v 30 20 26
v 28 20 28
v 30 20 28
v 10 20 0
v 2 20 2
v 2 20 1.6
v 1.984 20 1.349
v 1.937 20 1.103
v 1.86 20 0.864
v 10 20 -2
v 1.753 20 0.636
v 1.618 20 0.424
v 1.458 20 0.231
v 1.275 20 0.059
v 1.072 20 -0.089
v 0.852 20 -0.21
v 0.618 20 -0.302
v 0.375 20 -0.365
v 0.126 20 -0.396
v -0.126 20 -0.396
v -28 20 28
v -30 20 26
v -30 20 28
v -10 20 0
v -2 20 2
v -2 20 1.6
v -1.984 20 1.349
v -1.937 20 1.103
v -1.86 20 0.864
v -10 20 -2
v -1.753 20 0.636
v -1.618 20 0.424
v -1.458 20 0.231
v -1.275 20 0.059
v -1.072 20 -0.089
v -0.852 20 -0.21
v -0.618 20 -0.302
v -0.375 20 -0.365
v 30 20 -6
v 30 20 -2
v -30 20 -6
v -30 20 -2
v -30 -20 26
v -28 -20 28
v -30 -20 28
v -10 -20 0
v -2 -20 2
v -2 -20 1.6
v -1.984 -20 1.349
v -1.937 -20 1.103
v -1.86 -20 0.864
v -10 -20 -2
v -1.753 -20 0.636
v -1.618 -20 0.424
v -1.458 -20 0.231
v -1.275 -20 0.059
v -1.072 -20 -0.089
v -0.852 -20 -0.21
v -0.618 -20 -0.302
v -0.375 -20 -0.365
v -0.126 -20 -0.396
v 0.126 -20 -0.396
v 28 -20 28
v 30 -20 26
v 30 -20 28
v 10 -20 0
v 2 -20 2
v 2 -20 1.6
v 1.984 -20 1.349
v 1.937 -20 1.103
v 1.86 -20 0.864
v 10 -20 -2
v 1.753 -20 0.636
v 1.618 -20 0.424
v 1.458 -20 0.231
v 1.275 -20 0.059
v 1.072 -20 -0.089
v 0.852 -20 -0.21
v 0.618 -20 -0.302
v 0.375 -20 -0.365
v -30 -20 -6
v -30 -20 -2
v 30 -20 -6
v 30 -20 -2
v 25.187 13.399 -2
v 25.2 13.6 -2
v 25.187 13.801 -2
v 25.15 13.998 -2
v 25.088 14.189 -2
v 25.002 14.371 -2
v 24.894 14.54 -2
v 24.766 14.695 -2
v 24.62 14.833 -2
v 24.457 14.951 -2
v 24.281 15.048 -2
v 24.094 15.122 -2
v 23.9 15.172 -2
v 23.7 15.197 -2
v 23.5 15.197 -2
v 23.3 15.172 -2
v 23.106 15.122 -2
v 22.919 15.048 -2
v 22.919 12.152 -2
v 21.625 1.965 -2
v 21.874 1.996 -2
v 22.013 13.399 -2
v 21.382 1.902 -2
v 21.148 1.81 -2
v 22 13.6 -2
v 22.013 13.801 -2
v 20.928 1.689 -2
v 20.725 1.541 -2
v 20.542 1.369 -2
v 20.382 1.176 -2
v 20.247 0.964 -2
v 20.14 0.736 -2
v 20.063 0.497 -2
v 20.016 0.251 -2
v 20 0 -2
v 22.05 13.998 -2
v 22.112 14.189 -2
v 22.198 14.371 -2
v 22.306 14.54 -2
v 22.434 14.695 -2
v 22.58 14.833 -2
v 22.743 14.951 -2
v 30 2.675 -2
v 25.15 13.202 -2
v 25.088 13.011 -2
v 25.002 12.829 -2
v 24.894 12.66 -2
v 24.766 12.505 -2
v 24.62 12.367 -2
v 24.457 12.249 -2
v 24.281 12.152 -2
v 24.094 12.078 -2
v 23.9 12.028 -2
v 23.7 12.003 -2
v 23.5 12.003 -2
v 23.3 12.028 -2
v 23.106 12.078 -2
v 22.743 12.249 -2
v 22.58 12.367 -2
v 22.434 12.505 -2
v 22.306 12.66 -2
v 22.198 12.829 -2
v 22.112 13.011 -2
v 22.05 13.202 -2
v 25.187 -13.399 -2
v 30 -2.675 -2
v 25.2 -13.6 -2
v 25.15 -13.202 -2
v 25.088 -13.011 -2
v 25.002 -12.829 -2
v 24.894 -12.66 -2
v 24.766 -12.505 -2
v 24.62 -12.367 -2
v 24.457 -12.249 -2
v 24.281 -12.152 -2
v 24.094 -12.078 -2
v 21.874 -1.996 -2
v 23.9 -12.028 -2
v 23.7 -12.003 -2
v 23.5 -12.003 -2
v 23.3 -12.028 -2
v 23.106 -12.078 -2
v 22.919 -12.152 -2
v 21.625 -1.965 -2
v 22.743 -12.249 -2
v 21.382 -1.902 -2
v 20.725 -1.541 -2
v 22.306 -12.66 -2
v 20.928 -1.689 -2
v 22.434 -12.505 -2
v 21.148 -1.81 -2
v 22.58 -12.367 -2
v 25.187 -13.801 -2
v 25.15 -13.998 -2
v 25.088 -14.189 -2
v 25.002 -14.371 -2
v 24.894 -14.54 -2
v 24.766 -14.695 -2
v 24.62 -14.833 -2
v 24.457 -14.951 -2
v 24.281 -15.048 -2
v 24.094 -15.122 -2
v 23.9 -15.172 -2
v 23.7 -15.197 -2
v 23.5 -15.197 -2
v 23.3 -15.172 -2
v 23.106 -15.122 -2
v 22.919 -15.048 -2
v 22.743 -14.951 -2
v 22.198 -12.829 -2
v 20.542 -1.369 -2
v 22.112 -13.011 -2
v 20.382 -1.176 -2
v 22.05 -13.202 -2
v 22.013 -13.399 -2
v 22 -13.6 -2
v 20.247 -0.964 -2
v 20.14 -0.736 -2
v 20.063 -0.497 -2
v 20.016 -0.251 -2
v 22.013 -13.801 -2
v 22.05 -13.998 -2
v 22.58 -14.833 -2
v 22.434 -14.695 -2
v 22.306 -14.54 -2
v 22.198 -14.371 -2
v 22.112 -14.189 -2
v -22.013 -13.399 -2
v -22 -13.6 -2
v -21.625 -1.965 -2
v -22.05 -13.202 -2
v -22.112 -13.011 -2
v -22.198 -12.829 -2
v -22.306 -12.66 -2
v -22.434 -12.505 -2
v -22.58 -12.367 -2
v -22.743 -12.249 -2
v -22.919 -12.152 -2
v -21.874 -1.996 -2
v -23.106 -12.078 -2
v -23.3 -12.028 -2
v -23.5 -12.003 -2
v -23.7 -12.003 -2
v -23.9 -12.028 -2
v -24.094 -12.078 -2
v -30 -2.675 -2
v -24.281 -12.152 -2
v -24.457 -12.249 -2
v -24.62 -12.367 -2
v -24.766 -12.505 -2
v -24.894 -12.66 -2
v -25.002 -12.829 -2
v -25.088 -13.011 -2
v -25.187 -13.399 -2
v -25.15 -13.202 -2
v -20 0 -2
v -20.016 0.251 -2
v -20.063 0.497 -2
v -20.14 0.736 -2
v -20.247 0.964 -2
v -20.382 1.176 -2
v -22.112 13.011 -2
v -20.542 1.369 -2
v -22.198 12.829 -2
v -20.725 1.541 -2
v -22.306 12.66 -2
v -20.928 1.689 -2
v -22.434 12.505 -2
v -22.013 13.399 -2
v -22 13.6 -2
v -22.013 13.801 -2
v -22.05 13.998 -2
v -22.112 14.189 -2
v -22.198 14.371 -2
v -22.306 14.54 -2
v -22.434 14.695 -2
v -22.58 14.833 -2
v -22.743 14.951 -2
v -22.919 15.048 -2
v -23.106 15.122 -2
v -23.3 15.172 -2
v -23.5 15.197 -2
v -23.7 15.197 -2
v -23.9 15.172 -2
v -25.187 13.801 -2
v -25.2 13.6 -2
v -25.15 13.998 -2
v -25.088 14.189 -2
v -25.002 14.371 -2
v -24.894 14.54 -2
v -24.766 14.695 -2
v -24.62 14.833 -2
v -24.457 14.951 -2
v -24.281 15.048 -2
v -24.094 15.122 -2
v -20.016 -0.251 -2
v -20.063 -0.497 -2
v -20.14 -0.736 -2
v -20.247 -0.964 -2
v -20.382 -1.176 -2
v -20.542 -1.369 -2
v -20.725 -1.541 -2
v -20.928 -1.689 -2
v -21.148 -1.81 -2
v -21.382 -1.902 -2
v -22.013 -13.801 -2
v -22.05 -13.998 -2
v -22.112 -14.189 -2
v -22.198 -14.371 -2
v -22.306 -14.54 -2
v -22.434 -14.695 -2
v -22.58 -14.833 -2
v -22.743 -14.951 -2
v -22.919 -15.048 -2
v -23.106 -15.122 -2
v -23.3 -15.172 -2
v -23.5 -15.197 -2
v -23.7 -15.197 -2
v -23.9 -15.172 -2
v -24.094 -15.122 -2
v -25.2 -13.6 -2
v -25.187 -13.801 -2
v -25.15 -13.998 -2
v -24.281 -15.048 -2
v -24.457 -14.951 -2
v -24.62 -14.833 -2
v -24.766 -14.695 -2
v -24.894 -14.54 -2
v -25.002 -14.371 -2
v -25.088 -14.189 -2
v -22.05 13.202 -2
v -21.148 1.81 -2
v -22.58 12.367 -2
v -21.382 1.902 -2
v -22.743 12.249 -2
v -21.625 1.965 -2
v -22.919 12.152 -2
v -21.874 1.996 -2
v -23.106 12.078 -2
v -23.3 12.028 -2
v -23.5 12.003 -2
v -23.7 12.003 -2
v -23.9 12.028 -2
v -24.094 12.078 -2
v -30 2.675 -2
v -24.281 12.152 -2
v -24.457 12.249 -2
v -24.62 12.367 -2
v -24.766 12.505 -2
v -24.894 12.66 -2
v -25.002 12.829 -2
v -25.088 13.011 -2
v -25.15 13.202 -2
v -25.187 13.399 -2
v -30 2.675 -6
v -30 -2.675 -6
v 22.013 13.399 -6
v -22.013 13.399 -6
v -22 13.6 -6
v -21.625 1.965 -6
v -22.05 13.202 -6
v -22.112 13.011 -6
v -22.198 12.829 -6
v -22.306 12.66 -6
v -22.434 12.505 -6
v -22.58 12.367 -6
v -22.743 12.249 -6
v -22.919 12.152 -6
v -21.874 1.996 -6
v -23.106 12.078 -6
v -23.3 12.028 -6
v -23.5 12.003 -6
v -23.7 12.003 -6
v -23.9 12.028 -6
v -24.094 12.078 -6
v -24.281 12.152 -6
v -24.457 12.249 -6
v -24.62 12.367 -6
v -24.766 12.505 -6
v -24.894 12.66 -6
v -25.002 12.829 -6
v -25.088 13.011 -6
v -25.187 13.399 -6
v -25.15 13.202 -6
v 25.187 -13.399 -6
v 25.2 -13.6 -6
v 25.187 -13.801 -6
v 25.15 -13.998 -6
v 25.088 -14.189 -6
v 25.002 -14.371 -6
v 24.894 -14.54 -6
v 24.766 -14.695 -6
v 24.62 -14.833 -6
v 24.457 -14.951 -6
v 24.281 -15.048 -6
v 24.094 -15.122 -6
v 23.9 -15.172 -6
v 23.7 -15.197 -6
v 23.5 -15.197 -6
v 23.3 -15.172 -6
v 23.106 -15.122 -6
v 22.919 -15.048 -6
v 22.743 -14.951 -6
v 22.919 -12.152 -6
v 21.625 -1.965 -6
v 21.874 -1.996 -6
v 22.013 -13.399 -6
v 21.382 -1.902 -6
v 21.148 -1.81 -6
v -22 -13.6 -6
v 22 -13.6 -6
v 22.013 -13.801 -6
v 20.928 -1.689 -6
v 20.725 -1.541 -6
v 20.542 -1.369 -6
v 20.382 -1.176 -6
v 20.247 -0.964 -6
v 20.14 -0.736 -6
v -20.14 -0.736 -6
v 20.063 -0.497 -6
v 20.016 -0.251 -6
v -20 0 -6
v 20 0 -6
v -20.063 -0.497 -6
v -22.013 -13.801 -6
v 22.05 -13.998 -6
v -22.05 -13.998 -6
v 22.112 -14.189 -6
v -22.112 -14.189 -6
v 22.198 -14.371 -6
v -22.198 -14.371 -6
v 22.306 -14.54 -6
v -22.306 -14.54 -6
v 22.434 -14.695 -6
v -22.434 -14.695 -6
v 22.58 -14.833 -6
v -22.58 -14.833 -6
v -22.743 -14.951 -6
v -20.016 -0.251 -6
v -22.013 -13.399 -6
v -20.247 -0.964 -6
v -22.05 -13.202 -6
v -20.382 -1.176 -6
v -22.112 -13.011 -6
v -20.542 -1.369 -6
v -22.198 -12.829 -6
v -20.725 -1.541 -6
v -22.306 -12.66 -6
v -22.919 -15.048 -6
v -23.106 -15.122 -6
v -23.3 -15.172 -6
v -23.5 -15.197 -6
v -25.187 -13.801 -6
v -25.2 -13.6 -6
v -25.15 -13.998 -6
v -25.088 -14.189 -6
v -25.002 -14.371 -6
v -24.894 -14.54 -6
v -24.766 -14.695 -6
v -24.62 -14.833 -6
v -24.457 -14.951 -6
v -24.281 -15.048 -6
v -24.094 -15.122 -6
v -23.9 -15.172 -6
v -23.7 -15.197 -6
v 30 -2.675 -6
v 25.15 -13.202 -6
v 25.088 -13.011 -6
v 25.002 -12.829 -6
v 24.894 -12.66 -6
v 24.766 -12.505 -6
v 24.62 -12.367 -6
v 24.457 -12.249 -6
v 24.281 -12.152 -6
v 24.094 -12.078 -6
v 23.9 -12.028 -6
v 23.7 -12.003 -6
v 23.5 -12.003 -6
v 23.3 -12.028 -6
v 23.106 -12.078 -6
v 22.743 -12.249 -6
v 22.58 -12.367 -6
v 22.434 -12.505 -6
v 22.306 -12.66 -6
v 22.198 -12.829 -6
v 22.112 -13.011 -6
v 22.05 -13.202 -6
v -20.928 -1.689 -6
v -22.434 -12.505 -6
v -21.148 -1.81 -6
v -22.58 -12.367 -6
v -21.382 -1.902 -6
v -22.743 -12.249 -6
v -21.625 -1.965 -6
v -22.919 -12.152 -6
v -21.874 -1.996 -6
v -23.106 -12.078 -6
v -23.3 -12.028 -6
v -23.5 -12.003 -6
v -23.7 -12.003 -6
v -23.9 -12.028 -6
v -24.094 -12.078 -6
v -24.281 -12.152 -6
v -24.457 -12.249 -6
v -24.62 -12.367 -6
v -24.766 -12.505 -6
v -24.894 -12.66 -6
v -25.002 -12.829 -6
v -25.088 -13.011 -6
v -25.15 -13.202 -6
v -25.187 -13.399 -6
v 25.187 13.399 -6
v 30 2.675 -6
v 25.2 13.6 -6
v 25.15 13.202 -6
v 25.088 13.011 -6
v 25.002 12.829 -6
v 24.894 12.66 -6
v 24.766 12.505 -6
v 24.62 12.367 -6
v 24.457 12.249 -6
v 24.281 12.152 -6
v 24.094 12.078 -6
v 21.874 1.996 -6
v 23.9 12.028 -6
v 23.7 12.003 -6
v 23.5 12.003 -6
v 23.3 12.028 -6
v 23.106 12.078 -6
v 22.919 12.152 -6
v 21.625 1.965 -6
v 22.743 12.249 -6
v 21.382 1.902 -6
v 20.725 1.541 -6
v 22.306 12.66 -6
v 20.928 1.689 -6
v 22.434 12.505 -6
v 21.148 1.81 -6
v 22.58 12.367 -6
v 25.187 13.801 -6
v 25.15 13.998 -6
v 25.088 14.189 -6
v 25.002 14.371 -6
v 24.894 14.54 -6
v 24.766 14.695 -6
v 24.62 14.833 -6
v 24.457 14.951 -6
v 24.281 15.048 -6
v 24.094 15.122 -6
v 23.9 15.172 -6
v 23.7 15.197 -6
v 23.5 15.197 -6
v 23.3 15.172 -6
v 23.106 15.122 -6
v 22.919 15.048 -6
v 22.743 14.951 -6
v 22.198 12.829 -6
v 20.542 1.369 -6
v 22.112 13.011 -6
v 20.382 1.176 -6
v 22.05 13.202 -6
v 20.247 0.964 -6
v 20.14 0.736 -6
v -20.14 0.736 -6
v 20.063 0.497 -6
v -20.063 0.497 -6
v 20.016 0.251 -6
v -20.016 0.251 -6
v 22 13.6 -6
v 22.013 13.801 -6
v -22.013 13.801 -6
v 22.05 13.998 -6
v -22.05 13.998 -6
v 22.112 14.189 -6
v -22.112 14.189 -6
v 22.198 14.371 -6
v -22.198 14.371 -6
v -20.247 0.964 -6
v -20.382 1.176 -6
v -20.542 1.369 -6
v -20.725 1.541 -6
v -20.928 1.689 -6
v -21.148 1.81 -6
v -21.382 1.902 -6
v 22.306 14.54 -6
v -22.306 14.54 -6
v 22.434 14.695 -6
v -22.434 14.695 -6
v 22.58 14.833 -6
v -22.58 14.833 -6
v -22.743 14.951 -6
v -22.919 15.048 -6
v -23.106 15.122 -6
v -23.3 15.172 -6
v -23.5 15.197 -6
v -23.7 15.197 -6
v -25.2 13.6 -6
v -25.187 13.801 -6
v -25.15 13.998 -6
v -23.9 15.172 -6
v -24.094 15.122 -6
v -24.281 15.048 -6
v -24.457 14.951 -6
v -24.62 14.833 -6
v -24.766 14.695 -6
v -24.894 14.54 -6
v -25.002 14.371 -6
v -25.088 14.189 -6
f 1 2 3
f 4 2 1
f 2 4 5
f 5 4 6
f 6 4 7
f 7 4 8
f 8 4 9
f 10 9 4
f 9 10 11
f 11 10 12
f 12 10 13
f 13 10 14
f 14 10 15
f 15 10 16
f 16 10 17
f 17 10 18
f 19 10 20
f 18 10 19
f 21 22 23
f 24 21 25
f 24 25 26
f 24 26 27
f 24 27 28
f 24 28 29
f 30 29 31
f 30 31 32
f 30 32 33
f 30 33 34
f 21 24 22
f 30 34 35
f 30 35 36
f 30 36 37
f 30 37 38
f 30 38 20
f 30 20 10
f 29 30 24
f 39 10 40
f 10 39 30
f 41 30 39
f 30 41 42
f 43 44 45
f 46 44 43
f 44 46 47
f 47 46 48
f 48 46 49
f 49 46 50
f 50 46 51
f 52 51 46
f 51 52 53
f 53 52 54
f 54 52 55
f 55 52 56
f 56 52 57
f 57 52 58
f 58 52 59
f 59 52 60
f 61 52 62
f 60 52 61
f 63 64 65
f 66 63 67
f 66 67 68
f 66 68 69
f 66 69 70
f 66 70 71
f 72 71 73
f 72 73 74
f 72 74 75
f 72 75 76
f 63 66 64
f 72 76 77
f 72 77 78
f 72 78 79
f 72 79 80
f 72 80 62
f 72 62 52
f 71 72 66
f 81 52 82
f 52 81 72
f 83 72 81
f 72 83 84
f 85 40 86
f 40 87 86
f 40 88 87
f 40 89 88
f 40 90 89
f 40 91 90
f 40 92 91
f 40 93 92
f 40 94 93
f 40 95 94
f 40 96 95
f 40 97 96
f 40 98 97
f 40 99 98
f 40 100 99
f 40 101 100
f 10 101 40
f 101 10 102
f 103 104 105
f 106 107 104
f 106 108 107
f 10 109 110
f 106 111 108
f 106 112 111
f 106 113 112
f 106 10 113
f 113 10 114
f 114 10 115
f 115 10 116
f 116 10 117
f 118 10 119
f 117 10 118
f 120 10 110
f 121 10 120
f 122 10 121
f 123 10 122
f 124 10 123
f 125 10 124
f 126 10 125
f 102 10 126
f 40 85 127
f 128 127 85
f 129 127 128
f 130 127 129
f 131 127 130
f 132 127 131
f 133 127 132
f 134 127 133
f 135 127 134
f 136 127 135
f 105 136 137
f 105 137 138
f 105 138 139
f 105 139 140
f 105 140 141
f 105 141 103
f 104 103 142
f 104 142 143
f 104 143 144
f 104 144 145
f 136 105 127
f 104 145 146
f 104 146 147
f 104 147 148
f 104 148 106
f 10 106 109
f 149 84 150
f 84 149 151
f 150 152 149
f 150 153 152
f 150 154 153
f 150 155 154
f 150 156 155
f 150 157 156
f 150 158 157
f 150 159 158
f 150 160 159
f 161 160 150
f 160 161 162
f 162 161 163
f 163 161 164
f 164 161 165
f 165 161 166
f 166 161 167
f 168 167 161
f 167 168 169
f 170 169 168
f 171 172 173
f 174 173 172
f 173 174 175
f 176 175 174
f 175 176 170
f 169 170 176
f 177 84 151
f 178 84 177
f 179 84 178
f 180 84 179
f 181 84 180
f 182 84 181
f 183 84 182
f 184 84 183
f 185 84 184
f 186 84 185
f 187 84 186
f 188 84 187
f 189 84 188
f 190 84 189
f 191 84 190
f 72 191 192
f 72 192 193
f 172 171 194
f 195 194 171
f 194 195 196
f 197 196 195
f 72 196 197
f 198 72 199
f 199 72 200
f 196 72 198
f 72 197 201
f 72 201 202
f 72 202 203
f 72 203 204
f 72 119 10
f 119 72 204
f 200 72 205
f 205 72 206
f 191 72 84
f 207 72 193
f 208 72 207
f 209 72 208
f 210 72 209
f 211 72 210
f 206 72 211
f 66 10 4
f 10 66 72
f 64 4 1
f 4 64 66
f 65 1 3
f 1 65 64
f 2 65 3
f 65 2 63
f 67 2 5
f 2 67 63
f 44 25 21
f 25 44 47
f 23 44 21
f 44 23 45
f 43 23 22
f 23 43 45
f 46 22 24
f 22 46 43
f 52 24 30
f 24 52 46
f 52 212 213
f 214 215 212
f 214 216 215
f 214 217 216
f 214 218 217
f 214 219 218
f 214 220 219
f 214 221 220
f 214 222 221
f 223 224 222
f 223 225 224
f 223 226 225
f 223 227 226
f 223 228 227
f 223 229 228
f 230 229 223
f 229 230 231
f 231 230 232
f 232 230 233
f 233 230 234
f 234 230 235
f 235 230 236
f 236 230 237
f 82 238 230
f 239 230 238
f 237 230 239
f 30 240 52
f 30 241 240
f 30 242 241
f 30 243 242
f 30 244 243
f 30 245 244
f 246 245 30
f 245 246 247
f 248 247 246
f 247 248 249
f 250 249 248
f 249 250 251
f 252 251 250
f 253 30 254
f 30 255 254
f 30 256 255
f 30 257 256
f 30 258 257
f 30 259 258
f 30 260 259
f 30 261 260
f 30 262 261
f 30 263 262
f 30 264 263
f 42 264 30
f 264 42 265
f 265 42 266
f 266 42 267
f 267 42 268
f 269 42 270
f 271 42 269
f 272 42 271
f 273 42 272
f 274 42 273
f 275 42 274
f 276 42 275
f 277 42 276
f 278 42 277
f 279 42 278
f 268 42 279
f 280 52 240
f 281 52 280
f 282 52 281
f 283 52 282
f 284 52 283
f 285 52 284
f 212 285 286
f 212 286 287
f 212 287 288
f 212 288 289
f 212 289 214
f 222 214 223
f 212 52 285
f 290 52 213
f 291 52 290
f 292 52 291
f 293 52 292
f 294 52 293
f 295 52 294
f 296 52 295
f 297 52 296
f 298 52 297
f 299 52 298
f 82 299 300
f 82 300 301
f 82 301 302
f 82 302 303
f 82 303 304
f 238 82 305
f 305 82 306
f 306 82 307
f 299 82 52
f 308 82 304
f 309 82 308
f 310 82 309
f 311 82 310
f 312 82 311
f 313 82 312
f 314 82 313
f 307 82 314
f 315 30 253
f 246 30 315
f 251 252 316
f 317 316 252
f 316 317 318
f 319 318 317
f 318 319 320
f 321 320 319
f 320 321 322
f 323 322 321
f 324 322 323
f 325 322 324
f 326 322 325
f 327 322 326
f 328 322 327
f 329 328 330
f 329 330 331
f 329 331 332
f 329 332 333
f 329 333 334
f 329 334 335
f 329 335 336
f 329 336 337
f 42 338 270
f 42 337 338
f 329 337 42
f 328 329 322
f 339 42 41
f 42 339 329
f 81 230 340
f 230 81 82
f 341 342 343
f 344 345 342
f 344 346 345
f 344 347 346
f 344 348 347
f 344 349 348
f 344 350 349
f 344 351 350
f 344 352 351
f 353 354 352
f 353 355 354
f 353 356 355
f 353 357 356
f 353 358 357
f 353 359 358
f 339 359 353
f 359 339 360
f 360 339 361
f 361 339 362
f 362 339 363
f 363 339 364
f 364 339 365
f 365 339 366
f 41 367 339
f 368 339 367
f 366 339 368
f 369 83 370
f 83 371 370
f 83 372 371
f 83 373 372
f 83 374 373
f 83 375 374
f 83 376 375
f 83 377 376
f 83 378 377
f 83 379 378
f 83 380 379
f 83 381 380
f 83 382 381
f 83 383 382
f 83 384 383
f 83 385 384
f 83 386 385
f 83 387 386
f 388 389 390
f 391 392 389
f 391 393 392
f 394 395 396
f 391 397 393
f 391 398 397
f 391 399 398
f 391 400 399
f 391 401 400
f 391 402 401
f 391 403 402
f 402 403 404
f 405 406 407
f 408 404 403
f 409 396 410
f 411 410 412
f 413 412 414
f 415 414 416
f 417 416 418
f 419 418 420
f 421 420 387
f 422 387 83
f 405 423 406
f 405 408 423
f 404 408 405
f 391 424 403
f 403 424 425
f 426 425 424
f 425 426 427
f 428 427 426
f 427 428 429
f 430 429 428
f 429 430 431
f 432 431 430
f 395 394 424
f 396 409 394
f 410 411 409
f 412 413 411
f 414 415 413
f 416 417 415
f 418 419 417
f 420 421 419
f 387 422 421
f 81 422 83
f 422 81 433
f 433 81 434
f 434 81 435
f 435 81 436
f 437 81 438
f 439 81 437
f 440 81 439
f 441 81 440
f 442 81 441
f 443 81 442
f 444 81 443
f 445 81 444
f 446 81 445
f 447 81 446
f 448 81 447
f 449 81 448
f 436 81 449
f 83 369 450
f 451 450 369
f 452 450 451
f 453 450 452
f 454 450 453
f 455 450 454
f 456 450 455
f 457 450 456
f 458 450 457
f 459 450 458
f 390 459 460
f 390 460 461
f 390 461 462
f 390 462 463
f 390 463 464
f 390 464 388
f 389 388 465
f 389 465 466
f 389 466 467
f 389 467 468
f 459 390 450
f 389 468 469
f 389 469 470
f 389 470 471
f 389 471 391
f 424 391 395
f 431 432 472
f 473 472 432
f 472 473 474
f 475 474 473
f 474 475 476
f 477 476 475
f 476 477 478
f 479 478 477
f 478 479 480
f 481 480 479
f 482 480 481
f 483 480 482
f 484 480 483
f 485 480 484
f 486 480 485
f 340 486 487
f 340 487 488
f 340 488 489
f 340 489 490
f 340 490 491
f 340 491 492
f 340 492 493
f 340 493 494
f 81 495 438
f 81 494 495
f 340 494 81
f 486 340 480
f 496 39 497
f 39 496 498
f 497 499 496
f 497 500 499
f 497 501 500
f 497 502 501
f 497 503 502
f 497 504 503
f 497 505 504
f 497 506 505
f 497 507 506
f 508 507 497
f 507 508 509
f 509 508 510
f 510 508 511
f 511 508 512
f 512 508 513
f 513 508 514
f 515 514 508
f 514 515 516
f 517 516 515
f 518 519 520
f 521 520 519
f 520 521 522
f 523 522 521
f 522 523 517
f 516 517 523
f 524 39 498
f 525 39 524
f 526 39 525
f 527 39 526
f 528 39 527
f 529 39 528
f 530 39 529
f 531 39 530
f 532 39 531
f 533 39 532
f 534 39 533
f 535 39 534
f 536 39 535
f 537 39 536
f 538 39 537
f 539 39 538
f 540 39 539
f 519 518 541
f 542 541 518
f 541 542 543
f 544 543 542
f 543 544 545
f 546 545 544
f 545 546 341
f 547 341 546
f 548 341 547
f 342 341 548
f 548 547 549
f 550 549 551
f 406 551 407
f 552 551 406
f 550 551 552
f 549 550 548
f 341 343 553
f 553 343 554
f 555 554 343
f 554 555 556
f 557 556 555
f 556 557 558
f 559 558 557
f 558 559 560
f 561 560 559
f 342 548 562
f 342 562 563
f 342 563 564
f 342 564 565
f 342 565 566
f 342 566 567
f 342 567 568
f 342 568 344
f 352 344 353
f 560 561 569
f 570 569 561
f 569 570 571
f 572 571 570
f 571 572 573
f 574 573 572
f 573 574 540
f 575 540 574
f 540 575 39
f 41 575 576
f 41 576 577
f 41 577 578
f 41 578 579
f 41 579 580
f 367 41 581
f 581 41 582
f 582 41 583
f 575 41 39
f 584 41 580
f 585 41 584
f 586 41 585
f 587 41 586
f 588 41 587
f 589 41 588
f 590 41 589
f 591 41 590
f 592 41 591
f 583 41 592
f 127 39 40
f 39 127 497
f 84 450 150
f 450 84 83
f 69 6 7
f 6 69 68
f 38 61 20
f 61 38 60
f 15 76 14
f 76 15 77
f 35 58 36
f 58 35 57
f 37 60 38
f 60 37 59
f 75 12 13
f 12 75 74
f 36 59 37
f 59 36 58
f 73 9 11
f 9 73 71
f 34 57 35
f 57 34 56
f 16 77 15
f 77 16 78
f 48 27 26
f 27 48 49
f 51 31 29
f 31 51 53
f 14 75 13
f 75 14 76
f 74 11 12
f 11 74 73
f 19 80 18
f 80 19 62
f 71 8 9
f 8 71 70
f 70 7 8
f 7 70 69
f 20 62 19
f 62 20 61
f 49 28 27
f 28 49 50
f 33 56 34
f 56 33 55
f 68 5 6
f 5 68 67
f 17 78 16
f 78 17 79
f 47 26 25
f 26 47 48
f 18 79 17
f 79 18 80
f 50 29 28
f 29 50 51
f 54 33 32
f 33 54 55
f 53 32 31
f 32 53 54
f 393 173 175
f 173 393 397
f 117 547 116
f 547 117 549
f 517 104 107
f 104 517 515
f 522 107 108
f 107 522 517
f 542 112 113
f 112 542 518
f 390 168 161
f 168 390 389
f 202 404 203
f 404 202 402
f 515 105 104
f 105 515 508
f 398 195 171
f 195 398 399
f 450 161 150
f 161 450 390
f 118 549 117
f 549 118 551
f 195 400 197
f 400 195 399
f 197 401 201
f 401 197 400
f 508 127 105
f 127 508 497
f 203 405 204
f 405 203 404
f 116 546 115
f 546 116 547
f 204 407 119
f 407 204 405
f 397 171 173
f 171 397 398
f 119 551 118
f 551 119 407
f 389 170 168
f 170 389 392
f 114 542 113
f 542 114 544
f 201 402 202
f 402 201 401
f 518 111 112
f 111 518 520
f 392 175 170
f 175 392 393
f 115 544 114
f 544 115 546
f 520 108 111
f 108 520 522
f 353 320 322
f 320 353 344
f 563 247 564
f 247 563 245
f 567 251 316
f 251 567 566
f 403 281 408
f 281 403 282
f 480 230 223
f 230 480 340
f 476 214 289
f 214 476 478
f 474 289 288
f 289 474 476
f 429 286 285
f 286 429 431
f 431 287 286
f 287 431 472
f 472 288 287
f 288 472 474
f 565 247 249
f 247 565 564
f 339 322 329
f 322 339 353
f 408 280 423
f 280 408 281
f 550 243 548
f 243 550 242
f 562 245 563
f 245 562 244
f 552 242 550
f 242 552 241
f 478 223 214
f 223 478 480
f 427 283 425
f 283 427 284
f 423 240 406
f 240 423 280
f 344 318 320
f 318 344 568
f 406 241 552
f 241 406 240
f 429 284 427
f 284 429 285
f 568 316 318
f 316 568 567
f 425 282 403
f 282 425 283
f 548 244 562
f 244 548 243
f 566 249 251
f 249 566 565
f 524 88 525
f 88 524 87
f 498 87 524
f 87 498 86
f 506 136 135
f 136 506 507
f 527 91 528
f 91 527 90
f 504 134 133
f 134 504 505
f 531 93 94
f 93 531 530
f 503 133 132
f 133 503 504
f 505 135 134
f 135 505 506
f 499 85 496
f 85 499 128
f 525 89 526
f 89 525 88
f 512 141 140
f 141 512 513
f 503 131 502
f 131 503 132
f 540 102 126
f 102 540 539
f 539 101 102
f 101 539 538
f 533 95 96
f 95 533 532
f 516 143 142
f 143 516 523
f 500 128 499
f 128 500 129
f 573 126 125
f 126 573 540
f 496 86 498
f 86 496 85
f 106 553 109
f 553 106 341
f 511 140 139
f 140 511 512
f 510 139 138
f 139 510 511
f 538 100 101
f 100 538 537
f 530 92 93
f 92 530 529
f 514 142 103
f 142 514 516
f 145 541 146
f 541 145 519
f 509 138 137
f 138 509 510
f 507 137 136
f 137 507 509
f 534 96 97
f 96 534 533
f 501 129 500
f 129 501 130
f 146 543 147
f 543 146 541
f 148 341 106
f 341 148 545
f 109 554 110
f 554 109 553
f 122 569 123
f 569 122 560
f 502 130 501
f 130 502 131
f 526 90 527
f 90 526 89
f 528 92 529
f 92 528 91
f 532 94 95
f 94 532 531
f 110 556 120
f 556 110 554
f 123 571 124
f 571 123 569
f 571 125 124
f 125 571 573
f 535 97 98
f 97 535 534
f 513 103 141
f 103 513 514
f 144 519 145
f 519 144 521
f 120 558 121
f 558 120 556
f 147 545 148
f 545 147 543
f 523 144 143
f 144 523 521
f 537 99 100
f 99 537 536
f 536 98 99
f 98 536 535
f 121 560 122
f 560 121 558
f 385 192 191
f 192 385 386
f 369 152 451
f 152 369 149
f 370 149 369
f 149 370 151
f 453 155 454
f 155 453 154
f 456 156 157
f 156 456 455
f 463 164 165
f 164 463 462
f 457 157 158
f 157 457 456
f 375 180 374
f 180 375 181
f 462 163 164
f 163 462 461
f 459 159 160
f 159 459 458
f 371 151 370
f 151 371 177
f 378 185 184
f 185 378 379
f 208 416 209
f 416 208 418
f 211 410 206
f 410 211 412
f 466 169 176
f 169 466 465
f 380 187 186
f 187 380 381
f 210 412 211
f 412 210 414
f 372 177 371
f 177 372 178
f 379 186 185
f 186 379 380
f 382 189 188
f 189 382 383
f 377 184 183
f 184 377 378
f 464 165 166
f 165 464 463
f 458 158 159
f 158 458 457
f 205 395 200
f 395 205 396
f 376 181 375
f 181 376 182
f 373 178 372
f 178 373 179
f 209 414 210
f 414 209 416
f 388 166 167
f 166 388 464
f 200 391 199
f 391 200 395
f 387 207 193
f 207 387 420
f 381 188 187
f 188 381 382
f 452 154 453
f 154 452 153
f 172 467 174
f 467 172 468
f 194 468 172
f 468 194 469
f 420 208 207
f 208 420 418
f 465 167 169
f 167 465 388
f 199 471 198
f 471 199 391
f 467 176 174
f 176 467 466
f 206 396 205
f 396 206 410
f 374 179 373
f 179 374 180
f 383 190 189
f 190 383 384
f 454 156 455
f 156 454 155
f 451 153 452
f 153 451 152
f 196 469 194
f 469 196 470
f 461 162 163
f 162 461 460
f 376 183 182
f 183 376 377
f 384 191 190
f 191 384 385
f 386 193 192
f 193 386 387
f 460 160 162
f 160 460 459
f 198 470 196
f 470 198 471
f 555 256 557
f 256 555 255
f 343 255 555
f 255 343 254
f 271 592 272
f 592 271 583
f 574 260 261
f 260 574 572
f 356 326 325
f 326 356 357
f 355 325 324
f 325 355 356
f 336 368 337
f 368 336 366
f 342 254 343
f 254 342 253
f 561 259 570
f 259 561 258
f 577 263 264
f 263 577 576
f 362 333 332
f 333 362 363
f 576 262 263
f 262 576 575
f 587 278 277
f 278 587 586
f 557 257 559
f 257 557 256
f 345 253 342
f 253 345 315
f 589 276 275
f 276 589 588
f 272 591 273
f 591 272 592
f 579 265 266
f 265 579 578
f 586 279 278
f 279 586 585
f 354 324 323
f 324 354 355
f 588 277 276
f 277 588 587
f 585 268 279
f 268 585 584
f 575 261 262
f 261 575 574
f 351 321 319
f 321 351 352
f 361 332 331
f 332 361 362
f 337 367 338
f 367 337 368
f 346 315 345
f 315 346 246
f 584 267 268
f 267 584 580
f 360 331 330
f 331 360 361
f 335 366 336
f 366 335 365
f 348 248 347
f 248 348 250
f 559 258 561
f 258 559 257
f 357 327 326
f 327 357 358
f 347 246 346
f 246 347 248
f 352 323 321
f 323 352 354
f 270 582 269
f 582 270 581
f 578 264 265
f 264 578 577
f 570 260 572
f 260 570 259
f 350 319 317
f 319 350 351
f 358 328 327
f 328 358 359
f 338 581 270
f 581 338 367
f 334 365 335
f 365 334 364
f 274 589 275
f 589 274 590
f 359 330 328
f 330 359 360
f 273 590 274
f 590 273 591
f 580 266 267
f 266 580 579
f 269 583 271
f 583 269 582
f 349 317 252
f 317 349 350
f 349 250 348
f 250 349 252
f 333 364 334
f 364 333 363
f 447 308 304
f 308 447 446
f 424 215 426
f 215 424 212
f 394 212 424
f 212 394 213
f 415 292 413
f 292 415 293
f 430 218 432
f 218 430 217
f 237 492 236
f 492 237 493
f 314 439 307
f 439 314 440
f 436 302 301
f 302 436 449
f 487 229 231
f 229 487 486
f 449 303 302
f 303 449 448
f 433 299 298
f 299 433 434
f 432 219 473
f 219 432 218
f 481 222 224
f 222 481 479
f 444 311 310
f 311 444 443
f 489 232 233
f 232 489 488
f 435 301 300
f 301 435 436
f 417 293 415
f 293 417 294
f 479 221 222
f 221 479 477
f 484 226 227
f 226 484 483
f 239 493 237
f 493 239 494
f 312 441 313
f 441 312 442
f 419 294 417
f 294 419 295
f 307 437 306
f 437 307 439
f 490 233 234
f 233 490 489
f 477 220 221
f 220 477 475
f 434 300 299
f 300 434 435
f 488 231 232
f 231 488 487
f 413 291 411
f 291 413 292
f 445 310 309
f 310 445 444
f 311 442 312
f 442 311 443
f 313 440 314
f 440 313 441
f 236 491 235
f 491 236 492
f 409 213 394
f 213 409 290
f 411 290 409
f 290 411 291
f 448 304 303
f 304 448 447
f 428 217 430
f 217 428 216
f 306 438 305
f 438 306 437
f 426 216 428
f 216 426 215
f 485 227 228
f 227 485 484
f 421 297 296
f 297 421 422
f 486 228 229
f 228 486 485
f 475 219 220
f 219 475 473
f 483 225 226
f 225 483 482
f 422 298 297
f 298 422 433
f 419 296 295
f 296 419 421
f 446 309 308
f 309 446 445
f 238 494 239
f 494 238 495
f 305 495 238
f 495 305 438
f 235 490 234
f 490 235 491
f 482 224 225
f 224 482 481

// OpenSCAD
// ==============================================
// V-block for centering round things
// J.Beale 5-FEB-2015
// ==============================================

w = 60	;  // overall width
len = 40;  // overall length
w1 =  2;  // width of top edge
w2 = 2;   // width of top side edge
w3 = 5*w1; // width of base section
h1 = ((w/2)-w1);  // depth of V groove
h2 = 6;  // height of base section
h3 = 4;  // height of base flange
brad = 2; // radius of bottom groove
swidth = 4;  // width of center mounting slot
mhd = 3.2;   // diameter of corner mounting holes

// ==============================================

fn=50;  // facets on cylinder
eps=0.03; // small number

// ---------------------------------
// points of polygon to extrude
AX=0; AY=0;
BX=(w/2)-w1; BY=h1;
CX=w/2; CY=h1;
DX=w/2; DY=h1-w2;
EX=w3; EY=0;
FX=w3; FY=-(h2-h3);
GX=w/2; GY=-(h2-h3);
HX=w/2; HY=-(h2);
IX=-HX; IY=HY;
JX=-GX; JY=GY;
KX=-FX; KY=FY;
LX=-EX; LY=EY;
MX=-DX; MY=DY;
NX=-CX; NY=CY;
OX=-BX; OY=CY;
// ---------------------------------


module vb1() {
// rotate([90,0,0]) 
  linear_extrude(height = len, center = true, convexity = 10, twist = 0)
  v_sect();
}

module v_sect() {  // 2-D cross section of V-block shape
  polygon( points=[ 
  [AX,AY],[BX,BY],[CX,CY],[DX,DY],
  [EX,EY],[FX,FY],[GX,GY],[HX,HY],
  [IX,IY],[JX,JY],[KX,KY],[LX,LY],
  [MX,MY],[NX,NY],[OX,OY] ]);
}


module rod1() {  // rounded groove at bottom of V shape
  hull() {
    cylinder(r=brad, h=len+2*eps, center=true, $fn=fn);
    translate([0,brad,0]) cylinder(r=brad, h=len+2*eps, center=true, $fn=fn);
  }
}

module vblock1() {
 difference() {
  vb1();
  translate([0,brad*0.8,0]) rod1();
 }
}

module slot1() {  // slot in base
 hull() {
  translate([w/2-2*swidth,0,-h3]) 
    cylinder(d=swidth, h=h3*3, center=true, $fn=fn);
  translate([w/2+swidth,0,-h3]) 
    cylinder(d=swidth*1.5, h=h3*3, center=true, $fn=fn);
 }
}

module vblock() {  // v-block with mounting holes in base
 difference() {
  rotate([90,0,0]) vblock1();
  slot1();
  rotate([0,0,180]) slot1();
  translate([w/2 - mhd*2,len/2 - mhd*2,-h3]) 
    cylinder(d=mhd, h=h3*2, center=true, $fn=fn);
  translate([w/2 - mhd*2,-(len/2 - mhd*2),-h3]) 
    cylinder(d=mhd, h=h3*2, center=true, $fn=fn);
  translate([-(w/2 - mhd*2),len/2 - mhd*2,-h3]) 
    cylinder(d=mhd, h=h3*2, center=true, $fn=fn);
  translate([-(w/2 - mhd*2),-(len/2 - mhd*2),-h3]) 
    cylinder(d=mhd, h=h3*2, center=true, $fn=fn);
 }
}

// rotate ([90,0,0]) 
vblock();
